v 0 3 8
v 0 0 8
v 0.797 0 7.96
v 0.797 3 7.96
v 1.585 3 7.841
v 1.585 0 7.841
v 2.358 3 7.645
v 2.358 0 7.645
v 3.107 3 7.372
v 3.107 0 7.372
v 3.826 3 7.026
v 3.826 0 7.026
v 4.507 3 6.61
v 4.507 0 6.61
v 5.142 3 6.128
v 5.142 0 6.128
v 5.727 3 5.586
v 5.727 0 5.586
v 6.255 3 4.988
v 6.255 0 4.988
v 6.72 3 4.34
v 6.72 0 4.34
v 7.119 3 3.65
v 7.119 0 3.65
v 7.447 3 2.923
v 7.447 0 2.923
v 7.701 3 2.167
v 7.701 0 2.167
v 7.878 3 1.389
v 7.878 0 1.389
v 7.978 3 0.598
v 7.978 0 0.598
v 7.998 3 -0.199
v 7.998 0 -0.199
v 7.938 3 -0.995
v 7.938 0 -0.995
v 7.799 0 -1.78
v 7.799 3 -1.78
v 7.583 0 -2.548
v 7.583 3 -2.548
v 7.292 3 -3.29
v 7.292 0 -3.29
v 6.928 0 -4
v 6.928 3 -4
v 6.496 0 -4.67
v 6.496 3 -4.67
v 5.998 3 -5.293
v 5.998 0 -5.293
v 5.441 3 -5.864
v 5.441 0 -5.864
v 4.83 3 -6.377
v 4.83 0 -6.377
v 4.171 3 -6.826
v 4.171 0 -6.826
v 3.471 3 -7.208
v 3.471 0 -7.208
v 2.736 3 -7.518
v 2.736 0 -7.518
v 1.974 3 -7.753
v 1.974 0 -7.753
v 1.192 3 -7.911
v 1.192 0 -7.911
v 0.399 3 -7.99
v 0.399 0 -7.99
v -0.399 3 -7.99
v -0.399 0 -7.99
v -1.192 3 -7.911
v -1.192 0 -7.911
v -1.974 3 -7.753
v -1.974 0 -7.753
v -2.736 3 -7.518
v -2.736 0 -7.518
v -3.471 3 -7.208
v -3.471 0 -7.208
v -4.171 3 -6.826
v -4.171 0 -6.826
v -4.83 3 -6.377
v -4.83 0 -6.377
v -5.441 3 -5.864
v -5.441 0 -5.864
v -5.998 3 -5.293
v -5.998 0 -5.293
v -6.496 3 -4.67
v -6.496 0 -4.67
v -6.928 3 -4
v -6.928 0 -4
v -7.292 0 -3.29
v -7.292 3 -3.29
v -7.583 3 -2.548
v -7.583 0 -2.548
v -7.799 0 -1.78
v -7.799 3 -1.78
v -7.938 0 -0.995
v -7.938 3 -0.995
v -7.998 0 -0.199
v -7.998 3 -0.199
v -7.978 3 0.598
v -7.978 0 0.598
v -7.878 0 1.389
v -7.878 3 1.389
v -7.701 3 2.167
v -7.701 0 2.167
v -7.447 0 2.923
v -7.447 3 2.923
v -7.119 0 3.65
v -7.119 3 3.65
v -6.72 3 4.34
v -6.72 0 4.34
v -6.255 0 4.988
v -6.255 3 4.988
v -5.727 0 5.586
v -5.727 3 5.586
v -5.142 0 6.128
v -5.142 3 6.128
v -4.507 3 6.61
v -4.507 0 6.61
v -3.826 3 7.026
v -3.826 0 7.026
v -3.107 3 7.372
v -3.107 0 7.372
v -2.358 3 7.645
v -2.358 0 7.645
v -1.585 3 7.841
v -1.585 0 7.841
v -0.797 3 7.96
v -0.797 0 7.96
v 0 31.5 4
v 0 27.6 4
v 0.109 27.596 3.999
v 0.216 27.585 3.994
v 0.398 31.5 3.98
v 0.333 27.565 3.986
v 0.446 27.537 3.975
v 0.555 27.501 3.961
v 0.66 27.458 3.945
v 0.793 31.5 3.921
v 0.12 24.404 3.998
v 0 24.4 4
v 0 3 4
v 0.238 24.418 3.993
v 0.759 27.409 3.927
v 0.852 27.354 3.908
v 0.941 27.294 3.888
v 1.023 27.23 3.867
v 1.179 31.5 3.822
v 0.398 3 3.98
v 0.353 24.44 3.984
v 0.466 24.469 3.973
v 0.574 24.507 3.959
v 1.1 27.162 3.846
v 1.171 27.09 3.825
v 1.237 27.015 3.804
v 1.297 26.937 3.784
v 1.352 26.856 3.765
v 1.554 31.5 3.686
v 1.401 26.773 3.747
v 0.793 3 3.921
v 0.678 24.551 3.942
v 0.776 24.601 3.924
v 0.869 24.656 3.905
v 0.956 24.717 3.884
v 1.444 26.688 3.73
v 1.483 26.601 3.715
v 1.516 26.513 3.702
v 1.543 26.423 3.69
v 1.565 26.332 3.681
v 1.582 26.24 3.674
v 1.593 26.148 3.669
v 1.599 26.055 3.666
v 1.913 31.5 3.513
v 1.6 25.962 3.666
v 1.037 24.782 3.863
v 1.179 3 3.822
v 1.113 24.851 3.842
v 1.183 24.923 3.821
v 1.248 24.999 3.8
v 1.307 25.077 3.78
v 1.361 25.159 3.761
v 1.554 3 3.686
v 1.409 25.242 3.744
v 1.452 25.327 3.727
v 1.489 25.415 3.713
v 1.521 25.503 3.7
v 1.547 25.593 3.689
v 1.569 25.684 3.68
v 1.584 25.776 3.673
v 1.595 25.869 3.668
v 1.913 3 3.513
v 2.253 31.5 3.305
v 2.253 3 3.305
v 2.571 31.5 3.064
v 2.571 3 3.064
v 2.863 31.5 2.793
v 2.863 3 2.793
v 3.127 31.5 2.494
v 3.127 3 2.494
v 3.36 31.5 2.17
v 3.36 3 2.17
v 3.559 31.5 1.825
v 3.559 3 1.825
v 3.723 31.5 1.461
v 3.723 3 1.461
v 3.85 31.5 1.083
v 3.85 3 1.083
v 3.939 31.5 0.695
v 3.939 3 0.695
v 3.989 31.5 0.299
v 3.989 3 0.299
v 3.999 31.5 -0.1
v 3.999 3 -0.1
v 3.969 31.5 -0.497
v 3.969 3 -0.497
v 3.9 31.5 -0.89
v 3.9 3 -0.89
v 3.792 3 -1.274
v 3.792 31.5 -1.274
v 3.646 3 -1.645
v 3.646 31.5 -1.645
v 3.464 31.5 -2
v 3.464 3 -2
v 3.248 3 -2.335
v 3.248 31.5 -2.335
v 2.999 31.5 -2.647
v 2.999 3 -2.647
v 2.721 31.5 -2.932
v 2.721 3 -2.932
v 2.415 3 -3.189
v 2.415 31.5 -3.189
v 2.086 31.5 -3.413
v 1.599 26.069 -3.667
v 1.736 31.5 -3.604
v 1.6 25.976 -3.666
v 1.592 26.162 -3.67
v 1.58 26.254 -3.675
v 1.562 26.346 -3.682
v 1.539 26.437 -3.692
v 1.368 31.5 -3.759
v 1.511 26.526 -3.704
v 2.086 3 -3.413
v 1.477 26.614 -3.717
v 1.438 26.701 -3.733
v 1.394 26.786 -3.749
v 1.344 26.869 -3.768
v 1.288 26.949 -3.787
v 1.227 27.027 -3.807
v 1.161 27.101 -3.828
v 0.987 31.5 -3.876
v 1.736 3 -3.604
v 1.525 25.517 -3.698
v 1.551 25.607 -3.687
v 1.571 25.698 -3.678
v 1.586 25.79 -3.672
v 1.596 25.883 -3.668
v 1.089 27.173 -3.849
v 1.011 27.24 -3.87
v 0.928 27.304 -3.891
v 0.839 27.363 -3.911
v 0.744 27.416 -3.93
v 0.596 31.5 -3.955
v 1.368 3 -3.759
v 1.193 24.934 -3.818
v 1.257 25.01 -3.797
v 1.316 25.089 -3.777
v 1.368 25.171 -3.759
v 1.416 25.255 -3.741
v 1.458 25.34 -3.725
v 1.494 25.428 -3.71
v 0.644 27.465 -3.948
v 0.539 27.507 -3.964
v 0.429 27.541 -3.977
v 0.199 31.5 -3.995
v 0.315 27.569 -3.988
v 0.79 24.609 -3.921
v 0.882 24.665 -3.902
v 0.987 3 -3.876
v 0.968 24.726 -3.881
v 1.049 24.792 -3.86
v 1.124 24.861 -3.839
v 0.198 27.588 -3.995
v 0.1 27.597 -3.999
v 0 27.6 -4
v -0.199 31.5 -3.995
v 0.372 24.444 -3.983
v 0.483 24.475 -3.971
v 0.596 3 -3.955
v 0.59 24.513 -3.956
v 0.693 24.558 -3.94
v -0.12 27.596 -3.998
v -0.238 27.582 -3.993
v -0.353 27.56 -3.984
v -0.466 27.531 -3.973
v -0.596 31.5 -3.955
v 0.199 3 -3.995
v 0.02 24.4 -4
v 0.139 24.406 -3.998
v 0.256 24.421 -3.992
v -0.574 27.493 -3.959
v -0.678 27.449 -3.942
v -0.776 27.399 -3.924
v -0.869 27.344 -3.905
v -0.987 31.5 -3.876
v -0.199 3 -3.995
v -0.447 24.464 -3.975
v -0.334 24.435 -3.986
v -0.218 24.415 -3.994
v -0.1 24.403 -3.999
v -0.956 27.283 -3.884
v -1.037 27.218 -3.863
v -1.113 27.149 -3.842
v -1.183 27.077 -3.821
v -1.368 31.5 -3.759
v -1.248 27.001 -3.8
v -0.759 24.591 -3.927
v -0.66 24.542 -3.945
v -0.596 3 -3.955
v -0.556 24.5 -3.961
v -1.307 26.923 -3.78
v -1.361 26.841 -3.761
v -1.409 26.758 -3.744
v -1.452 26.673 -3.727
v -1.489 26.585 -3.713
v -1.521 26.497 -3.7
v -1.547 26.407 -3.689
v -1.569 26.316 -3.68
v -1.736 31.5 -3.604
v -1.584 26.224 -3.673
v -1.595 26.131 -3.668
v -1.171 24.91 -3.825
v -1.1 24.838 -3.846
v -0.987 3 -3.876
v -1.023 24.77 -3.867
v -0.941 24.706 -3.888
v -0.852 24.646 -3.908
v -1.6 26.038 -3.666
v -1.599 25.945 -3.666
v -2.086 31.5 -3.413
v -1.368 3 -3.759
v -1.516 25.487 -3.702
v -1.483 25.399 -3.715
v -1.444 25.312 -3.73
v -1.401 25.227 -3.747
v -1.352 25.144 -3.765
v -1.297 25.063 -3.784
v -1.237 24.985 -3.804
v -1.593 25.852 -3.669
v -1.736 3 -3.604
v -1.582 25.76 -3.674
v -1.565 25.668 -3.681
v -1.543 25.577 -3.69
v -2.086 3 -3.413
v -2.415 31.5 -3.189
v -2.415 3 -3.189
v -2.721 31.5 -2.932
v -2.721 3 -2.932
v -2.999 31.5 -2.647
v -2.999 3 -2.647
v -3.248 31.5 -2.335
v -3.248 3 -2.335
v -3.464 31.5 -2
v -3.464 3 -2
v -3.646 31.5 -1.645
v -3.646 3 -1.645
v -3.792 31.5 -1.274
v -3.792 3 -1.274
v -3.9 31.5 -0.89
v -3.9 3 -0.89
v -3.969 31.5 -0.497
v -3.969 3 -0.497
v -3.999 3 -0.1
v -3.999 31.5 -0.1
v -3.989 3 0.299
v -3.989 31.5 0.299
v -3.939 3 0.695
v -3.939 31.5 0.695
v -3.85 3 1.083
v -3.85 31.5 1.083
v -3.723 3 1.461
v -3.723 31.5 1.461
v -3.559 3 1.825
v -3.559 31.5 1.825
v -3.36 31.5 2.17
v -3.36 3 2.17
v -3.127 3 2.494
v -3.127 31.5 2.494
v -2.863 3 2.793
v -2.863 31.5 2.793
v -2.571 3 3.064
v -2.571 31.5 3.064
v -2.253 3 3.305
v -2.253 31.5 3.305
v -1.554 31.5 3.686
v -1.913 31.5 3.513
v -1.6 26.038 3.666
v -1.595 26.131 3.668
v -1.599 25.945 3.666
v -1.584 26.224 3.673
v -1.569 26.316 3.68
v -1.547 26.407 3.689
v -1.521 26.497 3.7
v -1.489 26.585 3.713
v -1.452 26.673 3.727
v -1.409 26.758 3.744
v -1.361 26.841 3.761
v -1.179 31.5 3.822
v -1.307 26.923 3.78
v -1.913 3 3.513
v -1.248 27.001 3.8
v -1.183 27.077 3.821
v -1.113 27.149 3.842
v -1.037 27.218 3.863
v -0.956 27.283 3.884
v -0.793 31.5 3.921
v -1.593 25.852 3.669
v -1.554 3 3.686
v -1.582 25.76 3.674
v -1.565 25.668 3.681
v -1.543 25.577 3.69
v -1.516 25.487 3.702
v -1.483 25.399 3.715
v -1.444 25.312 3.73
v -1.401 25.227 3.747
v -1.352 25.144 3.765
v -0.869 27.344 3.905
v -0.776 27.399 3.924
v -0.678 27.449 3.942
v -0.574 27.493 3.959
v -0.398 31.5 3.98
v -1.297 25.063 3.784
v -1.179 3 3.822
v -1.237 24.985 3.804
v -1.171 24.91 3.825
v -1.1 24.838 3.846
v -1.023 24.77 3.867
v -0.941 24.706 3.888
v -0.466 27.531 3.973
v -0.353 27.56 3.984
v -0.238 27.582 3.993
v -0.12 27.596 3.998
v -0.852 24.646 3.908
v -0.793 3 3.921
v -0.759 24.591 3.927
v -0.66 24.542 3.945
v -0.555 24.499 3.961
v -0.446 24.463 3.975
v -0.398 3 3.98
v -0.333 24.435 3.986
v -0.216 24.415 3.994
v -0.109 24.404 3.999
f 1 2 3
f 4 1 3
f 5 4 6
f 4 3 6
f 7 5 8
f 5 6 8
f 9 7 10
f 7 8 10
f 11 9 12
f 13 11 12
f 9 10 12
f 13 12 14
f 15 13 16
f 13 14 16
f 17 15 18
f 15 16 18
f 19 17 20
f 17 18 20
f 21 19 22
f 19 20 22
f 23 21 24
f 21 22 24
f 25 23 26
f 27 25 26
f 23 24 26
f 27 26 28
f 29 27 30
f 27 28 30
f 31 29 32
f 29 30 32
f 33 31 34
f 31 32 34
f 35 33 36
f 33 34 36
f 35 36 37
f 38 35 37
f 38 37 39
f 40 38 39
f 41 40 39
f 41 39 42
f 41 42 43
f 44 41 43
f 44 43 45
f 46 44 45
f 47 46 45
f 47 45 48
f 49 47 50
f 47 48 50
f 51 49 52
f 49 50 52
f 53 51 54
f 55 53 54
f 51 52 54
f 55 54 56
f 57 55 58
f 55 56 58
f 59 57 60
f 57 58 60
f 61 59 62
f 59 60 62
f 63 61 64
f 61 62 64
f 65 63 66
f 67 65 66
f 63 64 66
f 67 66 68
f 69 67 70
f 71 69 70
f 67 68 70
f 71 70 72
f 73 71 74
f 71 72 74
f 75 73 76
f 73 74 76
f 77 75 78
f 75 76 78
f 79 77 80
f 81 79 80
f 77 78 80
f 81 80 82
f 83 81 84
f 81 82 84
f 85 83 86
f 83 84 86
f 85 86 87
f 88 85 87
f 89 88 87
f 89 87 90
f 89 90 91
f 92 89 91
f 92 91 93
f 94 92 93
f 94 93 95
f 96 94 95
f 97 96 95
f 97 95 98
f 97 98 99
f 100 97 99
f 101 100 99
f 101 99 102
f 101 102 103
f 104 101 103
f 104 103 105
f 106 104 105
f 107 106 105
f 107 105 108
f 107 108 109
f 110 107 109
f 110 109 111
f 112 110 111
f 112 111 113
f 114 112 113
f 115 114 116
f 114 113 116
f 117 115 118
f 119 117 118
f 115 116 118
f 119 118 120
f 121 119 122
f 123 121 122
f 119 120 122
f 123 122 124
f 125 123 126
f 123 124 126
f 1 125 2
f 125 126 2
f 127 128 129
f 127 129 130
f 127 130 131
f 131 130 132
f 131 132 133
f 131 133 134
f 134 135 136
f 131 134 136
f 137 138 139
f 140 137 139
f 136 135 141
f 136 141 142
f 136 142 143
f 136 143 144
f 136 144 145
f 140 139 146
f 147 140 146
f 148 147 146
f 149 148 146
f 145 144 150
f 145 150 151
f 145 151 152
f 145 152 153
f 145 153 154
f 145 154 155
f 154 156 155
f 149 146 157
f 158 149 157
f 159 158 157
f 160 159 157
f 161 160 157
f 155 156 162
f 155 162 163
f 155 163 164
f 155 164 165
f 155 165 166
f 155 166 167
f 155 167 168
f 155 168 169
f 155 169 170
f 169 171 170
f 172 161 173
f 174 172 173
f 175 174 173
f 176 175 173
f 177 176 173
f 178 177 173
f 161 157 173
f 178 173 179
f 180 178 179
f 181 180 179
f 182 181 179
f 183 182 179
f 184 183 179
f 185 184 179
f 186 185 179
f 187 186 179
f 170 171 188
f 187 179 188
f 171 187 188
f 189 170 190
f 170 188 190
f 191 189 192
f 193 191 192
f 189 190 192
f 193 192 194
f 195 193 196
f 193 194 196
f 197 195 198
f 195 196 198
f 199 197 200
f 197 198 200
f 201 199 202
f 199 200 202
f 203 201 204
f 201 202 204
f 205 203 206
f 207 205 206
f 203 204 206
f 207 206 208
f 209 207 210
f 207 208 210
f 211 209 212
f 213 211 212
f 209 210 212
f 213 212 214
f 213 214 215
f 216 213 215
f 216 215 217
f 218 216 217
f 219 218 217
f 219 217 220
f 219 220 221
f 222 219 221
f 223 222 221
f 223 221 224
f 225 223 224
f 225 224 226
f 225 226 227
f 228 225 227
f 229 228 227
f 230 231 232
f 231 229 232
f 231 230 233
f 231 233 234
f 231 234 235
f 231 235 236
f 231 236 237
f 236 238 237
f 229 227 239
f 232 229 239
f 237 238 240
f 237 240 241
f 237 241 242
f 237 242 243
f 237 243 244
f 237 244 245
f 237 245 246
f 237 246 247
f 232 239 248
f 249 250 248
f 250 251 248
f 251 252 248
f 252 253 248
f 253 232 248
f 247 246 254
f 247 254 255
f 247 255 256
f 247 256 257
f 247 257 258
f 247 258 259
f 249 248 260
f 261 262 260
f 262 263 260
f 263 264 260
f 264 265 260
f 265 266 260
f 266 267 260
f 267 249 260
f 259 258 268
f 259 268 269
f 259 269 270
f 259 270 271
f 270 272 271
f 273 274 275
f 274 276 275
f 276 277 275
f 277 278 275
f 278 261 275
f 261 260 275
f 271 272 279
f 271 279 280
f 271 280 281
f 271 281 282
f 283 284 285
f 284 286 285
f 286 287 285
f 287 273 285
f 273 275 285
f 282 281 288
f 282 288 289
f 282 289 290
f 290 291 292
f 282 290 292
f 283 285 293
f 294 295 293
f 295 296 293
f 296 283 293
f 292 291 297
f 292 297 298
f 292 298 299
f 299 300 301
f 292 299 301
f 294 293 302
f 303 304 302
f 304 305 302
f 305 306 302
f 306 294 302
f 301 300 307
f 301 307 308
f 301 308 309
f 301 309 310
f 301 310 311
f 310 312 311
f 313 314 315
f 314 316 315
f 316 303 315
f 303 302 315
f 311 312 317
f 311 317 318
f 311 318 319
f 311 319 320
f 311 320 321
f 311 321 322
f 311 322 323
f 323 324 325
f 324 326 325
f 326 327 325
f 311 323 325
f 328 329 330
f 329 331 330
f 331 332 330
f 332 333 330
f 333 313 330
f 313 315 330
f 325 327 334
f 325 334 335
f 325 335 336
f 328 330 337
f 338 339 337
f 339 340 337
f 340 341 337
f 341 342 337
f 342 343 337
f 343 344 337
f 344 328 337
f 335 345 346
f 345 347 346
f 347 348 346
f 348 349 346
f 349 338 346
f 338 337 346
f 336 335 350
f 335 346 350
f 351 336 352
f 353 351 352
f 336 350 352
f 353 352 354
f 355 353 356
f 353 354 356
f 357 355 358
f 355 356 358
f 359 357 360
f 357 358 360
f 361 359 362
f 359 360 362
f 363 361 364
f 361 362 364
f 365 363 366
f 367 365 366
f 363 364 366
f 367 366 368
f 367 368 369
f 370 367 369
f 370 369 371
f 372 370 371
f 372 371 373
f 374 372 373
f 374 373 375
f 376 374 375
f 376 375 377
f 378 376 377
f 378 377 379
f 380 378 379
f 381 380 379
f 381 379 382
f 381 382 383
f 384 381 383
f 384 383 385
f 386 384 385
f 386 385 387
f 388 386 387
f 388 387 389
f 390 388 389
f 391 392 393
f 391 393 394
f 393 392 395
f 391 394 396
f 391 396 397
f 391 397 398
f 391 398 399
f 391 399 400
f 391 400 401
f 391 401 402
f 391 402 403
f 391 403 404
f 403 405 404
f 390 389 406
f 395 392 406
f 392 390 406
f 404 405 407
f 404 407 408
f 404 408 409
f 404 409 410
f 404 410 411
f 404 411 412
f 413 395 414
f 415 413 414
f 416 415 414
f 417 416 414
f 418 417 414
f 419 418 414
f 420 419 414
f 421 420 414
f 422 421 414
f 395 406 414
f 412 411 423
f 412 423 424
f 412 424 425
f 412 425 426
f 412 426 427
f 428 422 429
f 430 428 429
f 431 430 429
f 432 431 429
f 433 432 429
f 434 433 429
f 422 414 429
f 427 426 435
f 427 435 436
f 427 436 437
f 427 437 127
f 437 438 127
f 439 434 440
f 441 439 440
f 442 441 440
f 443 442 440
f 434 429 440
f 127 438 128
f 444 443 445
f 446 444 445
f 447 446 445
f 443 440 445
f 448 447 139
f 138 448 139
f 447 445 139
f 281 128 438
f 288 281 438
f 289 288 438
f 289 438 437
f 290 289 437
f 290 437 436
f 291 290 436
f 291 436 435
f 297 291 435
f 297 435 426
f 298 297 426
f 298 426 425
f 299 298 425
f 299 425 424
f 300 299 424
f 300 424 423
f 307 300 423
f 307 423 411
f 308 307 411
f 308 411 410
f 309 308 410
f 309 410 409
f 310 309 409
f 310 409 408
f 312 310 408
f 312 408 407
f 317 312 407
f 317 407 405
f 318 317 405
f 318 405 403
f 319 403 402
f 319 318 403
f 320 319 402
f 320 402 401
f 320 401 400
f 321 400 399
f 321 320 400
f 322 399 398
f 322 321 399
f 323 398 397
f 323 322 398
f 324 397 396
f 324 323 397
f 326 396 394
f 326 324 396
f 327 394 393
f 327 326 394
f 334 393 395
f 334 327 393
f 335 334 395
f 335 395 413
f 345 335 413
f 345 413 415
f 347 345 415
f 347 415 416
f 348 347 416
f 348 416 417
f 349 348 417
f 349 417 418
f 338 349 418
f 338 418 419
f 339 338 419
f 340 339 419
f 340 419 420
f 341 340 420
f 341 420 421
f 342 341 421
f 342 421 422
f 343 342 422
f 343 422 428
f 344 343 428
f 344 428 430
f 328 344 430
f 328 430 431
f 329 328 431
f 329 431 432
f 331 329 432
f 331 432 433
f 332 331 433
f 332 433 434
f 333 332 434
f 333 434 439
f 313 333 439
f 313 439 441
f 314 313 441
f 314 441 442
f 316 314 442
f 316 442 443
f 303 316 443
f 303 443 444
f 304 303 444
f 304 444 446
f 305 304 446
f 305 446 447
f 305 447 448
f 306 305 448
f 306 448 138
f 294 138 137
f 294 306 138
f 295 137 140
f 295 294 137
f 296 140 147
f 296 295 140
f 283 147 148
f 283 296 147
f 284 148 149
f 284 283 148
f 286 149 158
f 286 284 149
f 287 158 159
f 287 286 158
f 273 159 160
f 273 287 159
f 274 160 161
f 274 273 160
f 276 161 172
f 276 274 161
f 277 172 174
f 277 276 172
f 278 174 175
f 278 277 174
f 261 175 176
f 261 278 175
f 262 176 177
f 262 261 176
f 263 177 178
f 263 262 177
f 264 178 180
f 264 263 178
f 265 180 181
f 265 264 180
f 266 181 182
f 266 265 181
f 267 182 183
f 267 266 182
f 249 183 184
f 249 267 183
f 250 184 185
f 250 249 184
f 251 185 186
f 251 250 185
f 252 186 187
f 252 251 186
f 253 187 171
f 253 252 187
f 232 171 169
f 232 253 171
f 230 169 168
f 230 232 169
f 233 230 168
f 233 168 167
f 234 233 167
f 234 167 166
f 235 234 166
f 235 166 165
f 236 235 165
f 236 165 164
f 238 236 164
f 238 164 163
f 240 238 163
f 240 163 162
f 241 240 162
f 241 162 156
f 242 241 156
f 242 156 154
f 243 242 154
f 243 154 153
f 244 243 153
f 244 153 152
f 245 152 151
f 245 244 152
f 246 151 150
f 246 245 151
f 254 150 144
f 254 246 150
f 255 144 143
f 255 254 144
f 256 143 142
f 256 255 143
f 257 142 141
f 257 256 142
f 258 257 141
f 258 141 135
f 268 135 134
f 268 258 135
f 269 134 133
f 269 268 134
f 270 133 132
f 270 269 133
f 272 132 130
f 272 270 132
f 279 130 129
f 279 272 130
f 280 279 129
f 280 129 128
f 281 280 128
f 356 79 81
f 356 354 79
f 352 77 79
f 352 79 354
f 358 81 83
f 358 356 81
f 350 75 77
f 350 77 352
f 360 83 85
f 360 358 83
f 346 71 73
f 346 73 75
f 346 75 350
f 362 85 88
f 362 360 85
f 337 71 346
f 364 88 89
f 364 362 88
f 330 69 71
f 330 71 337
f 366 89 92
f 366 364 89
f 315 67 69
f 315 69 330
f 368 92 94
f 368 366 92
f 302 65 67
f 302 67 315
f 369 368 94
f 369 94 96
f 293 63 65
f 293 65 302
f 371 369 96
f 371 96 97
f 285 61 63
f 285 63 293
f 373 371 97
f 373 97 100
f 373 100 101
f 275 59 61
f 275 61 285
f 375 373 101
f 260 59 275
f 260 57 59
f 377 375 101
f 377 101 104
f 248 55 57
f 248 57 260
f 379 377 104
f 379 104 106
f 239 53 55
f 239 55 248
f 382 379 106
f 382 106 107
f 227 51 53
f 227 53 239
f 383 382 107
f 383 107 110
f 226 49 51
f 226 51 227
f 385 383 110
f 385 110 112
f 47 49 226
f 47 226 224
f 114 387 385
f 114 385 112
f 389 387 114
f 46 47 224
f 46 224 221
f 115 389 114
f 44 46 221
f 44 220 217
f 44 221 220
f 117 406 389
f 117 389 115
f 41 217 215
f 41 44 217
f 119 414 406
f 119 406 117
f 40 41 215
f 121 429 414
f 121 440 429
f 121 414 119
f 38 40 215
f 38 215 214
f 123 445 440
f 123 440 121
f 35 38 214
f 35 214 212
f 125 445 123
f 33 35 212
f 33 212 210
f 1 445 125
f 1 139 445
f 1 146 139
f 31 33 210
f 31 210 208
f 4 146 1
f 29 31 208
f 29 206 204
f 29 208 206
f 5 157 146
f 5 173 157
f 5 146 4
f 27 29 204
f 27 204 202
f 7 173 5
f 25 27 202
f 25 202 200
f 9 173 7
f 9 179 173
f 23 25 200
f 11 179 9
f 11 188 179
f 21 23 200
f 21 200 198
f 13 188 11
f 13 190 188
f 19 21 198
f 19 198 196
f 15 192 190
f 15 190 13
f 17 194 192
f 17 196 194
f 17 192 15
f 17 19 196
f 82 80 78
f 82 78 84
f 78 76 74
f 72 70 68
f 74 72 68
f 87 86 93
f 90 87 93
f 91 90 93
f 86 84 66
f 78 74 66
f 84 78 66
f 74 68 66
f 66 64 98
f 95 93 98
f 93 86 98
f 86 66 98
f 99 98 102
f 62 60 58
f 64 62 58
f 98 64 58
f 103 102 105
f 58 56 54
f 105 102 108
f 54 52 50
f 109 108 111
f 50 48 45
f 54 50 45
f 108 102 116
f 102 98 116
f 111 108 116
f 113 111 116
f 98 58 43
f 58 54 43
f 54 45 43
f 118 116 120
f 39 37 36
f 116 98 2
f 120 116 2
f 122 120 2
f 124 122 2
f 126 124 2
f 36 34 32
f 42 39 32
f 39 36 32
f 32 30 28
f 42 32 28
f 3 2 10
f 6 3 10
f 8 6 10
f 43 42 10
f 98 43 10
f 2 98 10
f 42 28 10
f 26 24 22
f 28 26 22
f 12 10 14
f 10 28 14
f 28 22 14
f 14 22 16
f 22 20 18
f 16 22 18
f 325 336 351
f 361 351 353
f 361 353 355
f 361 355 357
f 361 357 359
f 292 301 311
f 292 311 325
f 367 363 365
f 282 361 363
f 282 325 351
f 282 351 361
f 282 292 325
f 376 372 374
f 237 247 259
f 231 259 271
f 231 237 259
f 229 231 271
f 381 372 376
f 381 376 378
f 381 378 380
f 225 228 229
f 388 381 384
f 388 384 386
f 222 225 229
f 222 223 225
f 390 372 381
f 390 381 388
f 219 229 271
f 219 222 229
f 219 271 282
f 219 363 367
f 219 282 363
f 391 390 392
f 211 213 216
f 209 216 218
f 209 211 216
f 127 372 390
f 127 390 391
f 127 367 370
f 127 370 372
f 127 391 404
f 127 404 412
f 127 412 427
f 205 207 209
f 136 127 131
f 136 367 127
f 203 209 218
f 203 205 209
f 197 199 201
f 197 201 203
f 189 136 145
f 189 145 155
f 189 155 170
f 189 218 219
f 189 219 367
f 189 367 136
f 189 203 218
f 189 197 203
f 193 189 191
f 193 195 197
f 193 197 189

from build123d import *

# Parameters (mm, degrees)
ESQUISSE1_R                  = 8
ESQUISSE1_R_2                = 4
BOSS_EXTRU_1_DEPTH           = 3
ESQUISSE1_4_R                = 4
BOSS_EXTRU_3_DEPTH           = 31.5
ENL_V_MAT_EXTRU_1_DEPTH      = 10
ENL_V_MAT_EXTRU_1_DEPTH_BACK = 10
ESQUISSE2_R                  = 1.6


with BuildPart() as part:
    # Esquisse1 → Boss.-Extru.1 (new body)
    with BuildSketch(Plane(origin=(0, 0, 0), x_dir=(1, 0, 0), z_dir=(0, 1, 0))):
        Circle(ESQUISSE1_R)
        Circle(ESQUISSE1_R_2, mode=Mode.SUBTRACT)
    extrude(amount=BOSS_EXTRU_1_DEPTH)

    # Esquisse1<4> → Boss.-Extru.3 (add)
    with BuildSketch(Plane(origin=(0, 0, 0), x_dir=(1, 0, 0), z_dir=(0, 1, 0))):
        Circle(ESQUISSE1_4_R)
    extrude(amount=BOSS_EXTRU_3_DEPTH)

    # Esquisse2 → Enlèv. mat.-Extru.1 (cut, two sides: drawn at the far end of the back side and taken through both)
    with BuildSketch(Plane.XY.offset(-ENL_V_MAT_EXTRU_1_DEPTH_BACK)):
        with Locations((0, 26)):
            Circle(ESQUISSE2_R)
    extrude(amount=ENL_V_MAT_EXTRU_1_DEPTH + ENL_V_MAT_EXTRU_1_DEPTH_BACK, mode=Mode.SUBTRACT)


solid = part.part
